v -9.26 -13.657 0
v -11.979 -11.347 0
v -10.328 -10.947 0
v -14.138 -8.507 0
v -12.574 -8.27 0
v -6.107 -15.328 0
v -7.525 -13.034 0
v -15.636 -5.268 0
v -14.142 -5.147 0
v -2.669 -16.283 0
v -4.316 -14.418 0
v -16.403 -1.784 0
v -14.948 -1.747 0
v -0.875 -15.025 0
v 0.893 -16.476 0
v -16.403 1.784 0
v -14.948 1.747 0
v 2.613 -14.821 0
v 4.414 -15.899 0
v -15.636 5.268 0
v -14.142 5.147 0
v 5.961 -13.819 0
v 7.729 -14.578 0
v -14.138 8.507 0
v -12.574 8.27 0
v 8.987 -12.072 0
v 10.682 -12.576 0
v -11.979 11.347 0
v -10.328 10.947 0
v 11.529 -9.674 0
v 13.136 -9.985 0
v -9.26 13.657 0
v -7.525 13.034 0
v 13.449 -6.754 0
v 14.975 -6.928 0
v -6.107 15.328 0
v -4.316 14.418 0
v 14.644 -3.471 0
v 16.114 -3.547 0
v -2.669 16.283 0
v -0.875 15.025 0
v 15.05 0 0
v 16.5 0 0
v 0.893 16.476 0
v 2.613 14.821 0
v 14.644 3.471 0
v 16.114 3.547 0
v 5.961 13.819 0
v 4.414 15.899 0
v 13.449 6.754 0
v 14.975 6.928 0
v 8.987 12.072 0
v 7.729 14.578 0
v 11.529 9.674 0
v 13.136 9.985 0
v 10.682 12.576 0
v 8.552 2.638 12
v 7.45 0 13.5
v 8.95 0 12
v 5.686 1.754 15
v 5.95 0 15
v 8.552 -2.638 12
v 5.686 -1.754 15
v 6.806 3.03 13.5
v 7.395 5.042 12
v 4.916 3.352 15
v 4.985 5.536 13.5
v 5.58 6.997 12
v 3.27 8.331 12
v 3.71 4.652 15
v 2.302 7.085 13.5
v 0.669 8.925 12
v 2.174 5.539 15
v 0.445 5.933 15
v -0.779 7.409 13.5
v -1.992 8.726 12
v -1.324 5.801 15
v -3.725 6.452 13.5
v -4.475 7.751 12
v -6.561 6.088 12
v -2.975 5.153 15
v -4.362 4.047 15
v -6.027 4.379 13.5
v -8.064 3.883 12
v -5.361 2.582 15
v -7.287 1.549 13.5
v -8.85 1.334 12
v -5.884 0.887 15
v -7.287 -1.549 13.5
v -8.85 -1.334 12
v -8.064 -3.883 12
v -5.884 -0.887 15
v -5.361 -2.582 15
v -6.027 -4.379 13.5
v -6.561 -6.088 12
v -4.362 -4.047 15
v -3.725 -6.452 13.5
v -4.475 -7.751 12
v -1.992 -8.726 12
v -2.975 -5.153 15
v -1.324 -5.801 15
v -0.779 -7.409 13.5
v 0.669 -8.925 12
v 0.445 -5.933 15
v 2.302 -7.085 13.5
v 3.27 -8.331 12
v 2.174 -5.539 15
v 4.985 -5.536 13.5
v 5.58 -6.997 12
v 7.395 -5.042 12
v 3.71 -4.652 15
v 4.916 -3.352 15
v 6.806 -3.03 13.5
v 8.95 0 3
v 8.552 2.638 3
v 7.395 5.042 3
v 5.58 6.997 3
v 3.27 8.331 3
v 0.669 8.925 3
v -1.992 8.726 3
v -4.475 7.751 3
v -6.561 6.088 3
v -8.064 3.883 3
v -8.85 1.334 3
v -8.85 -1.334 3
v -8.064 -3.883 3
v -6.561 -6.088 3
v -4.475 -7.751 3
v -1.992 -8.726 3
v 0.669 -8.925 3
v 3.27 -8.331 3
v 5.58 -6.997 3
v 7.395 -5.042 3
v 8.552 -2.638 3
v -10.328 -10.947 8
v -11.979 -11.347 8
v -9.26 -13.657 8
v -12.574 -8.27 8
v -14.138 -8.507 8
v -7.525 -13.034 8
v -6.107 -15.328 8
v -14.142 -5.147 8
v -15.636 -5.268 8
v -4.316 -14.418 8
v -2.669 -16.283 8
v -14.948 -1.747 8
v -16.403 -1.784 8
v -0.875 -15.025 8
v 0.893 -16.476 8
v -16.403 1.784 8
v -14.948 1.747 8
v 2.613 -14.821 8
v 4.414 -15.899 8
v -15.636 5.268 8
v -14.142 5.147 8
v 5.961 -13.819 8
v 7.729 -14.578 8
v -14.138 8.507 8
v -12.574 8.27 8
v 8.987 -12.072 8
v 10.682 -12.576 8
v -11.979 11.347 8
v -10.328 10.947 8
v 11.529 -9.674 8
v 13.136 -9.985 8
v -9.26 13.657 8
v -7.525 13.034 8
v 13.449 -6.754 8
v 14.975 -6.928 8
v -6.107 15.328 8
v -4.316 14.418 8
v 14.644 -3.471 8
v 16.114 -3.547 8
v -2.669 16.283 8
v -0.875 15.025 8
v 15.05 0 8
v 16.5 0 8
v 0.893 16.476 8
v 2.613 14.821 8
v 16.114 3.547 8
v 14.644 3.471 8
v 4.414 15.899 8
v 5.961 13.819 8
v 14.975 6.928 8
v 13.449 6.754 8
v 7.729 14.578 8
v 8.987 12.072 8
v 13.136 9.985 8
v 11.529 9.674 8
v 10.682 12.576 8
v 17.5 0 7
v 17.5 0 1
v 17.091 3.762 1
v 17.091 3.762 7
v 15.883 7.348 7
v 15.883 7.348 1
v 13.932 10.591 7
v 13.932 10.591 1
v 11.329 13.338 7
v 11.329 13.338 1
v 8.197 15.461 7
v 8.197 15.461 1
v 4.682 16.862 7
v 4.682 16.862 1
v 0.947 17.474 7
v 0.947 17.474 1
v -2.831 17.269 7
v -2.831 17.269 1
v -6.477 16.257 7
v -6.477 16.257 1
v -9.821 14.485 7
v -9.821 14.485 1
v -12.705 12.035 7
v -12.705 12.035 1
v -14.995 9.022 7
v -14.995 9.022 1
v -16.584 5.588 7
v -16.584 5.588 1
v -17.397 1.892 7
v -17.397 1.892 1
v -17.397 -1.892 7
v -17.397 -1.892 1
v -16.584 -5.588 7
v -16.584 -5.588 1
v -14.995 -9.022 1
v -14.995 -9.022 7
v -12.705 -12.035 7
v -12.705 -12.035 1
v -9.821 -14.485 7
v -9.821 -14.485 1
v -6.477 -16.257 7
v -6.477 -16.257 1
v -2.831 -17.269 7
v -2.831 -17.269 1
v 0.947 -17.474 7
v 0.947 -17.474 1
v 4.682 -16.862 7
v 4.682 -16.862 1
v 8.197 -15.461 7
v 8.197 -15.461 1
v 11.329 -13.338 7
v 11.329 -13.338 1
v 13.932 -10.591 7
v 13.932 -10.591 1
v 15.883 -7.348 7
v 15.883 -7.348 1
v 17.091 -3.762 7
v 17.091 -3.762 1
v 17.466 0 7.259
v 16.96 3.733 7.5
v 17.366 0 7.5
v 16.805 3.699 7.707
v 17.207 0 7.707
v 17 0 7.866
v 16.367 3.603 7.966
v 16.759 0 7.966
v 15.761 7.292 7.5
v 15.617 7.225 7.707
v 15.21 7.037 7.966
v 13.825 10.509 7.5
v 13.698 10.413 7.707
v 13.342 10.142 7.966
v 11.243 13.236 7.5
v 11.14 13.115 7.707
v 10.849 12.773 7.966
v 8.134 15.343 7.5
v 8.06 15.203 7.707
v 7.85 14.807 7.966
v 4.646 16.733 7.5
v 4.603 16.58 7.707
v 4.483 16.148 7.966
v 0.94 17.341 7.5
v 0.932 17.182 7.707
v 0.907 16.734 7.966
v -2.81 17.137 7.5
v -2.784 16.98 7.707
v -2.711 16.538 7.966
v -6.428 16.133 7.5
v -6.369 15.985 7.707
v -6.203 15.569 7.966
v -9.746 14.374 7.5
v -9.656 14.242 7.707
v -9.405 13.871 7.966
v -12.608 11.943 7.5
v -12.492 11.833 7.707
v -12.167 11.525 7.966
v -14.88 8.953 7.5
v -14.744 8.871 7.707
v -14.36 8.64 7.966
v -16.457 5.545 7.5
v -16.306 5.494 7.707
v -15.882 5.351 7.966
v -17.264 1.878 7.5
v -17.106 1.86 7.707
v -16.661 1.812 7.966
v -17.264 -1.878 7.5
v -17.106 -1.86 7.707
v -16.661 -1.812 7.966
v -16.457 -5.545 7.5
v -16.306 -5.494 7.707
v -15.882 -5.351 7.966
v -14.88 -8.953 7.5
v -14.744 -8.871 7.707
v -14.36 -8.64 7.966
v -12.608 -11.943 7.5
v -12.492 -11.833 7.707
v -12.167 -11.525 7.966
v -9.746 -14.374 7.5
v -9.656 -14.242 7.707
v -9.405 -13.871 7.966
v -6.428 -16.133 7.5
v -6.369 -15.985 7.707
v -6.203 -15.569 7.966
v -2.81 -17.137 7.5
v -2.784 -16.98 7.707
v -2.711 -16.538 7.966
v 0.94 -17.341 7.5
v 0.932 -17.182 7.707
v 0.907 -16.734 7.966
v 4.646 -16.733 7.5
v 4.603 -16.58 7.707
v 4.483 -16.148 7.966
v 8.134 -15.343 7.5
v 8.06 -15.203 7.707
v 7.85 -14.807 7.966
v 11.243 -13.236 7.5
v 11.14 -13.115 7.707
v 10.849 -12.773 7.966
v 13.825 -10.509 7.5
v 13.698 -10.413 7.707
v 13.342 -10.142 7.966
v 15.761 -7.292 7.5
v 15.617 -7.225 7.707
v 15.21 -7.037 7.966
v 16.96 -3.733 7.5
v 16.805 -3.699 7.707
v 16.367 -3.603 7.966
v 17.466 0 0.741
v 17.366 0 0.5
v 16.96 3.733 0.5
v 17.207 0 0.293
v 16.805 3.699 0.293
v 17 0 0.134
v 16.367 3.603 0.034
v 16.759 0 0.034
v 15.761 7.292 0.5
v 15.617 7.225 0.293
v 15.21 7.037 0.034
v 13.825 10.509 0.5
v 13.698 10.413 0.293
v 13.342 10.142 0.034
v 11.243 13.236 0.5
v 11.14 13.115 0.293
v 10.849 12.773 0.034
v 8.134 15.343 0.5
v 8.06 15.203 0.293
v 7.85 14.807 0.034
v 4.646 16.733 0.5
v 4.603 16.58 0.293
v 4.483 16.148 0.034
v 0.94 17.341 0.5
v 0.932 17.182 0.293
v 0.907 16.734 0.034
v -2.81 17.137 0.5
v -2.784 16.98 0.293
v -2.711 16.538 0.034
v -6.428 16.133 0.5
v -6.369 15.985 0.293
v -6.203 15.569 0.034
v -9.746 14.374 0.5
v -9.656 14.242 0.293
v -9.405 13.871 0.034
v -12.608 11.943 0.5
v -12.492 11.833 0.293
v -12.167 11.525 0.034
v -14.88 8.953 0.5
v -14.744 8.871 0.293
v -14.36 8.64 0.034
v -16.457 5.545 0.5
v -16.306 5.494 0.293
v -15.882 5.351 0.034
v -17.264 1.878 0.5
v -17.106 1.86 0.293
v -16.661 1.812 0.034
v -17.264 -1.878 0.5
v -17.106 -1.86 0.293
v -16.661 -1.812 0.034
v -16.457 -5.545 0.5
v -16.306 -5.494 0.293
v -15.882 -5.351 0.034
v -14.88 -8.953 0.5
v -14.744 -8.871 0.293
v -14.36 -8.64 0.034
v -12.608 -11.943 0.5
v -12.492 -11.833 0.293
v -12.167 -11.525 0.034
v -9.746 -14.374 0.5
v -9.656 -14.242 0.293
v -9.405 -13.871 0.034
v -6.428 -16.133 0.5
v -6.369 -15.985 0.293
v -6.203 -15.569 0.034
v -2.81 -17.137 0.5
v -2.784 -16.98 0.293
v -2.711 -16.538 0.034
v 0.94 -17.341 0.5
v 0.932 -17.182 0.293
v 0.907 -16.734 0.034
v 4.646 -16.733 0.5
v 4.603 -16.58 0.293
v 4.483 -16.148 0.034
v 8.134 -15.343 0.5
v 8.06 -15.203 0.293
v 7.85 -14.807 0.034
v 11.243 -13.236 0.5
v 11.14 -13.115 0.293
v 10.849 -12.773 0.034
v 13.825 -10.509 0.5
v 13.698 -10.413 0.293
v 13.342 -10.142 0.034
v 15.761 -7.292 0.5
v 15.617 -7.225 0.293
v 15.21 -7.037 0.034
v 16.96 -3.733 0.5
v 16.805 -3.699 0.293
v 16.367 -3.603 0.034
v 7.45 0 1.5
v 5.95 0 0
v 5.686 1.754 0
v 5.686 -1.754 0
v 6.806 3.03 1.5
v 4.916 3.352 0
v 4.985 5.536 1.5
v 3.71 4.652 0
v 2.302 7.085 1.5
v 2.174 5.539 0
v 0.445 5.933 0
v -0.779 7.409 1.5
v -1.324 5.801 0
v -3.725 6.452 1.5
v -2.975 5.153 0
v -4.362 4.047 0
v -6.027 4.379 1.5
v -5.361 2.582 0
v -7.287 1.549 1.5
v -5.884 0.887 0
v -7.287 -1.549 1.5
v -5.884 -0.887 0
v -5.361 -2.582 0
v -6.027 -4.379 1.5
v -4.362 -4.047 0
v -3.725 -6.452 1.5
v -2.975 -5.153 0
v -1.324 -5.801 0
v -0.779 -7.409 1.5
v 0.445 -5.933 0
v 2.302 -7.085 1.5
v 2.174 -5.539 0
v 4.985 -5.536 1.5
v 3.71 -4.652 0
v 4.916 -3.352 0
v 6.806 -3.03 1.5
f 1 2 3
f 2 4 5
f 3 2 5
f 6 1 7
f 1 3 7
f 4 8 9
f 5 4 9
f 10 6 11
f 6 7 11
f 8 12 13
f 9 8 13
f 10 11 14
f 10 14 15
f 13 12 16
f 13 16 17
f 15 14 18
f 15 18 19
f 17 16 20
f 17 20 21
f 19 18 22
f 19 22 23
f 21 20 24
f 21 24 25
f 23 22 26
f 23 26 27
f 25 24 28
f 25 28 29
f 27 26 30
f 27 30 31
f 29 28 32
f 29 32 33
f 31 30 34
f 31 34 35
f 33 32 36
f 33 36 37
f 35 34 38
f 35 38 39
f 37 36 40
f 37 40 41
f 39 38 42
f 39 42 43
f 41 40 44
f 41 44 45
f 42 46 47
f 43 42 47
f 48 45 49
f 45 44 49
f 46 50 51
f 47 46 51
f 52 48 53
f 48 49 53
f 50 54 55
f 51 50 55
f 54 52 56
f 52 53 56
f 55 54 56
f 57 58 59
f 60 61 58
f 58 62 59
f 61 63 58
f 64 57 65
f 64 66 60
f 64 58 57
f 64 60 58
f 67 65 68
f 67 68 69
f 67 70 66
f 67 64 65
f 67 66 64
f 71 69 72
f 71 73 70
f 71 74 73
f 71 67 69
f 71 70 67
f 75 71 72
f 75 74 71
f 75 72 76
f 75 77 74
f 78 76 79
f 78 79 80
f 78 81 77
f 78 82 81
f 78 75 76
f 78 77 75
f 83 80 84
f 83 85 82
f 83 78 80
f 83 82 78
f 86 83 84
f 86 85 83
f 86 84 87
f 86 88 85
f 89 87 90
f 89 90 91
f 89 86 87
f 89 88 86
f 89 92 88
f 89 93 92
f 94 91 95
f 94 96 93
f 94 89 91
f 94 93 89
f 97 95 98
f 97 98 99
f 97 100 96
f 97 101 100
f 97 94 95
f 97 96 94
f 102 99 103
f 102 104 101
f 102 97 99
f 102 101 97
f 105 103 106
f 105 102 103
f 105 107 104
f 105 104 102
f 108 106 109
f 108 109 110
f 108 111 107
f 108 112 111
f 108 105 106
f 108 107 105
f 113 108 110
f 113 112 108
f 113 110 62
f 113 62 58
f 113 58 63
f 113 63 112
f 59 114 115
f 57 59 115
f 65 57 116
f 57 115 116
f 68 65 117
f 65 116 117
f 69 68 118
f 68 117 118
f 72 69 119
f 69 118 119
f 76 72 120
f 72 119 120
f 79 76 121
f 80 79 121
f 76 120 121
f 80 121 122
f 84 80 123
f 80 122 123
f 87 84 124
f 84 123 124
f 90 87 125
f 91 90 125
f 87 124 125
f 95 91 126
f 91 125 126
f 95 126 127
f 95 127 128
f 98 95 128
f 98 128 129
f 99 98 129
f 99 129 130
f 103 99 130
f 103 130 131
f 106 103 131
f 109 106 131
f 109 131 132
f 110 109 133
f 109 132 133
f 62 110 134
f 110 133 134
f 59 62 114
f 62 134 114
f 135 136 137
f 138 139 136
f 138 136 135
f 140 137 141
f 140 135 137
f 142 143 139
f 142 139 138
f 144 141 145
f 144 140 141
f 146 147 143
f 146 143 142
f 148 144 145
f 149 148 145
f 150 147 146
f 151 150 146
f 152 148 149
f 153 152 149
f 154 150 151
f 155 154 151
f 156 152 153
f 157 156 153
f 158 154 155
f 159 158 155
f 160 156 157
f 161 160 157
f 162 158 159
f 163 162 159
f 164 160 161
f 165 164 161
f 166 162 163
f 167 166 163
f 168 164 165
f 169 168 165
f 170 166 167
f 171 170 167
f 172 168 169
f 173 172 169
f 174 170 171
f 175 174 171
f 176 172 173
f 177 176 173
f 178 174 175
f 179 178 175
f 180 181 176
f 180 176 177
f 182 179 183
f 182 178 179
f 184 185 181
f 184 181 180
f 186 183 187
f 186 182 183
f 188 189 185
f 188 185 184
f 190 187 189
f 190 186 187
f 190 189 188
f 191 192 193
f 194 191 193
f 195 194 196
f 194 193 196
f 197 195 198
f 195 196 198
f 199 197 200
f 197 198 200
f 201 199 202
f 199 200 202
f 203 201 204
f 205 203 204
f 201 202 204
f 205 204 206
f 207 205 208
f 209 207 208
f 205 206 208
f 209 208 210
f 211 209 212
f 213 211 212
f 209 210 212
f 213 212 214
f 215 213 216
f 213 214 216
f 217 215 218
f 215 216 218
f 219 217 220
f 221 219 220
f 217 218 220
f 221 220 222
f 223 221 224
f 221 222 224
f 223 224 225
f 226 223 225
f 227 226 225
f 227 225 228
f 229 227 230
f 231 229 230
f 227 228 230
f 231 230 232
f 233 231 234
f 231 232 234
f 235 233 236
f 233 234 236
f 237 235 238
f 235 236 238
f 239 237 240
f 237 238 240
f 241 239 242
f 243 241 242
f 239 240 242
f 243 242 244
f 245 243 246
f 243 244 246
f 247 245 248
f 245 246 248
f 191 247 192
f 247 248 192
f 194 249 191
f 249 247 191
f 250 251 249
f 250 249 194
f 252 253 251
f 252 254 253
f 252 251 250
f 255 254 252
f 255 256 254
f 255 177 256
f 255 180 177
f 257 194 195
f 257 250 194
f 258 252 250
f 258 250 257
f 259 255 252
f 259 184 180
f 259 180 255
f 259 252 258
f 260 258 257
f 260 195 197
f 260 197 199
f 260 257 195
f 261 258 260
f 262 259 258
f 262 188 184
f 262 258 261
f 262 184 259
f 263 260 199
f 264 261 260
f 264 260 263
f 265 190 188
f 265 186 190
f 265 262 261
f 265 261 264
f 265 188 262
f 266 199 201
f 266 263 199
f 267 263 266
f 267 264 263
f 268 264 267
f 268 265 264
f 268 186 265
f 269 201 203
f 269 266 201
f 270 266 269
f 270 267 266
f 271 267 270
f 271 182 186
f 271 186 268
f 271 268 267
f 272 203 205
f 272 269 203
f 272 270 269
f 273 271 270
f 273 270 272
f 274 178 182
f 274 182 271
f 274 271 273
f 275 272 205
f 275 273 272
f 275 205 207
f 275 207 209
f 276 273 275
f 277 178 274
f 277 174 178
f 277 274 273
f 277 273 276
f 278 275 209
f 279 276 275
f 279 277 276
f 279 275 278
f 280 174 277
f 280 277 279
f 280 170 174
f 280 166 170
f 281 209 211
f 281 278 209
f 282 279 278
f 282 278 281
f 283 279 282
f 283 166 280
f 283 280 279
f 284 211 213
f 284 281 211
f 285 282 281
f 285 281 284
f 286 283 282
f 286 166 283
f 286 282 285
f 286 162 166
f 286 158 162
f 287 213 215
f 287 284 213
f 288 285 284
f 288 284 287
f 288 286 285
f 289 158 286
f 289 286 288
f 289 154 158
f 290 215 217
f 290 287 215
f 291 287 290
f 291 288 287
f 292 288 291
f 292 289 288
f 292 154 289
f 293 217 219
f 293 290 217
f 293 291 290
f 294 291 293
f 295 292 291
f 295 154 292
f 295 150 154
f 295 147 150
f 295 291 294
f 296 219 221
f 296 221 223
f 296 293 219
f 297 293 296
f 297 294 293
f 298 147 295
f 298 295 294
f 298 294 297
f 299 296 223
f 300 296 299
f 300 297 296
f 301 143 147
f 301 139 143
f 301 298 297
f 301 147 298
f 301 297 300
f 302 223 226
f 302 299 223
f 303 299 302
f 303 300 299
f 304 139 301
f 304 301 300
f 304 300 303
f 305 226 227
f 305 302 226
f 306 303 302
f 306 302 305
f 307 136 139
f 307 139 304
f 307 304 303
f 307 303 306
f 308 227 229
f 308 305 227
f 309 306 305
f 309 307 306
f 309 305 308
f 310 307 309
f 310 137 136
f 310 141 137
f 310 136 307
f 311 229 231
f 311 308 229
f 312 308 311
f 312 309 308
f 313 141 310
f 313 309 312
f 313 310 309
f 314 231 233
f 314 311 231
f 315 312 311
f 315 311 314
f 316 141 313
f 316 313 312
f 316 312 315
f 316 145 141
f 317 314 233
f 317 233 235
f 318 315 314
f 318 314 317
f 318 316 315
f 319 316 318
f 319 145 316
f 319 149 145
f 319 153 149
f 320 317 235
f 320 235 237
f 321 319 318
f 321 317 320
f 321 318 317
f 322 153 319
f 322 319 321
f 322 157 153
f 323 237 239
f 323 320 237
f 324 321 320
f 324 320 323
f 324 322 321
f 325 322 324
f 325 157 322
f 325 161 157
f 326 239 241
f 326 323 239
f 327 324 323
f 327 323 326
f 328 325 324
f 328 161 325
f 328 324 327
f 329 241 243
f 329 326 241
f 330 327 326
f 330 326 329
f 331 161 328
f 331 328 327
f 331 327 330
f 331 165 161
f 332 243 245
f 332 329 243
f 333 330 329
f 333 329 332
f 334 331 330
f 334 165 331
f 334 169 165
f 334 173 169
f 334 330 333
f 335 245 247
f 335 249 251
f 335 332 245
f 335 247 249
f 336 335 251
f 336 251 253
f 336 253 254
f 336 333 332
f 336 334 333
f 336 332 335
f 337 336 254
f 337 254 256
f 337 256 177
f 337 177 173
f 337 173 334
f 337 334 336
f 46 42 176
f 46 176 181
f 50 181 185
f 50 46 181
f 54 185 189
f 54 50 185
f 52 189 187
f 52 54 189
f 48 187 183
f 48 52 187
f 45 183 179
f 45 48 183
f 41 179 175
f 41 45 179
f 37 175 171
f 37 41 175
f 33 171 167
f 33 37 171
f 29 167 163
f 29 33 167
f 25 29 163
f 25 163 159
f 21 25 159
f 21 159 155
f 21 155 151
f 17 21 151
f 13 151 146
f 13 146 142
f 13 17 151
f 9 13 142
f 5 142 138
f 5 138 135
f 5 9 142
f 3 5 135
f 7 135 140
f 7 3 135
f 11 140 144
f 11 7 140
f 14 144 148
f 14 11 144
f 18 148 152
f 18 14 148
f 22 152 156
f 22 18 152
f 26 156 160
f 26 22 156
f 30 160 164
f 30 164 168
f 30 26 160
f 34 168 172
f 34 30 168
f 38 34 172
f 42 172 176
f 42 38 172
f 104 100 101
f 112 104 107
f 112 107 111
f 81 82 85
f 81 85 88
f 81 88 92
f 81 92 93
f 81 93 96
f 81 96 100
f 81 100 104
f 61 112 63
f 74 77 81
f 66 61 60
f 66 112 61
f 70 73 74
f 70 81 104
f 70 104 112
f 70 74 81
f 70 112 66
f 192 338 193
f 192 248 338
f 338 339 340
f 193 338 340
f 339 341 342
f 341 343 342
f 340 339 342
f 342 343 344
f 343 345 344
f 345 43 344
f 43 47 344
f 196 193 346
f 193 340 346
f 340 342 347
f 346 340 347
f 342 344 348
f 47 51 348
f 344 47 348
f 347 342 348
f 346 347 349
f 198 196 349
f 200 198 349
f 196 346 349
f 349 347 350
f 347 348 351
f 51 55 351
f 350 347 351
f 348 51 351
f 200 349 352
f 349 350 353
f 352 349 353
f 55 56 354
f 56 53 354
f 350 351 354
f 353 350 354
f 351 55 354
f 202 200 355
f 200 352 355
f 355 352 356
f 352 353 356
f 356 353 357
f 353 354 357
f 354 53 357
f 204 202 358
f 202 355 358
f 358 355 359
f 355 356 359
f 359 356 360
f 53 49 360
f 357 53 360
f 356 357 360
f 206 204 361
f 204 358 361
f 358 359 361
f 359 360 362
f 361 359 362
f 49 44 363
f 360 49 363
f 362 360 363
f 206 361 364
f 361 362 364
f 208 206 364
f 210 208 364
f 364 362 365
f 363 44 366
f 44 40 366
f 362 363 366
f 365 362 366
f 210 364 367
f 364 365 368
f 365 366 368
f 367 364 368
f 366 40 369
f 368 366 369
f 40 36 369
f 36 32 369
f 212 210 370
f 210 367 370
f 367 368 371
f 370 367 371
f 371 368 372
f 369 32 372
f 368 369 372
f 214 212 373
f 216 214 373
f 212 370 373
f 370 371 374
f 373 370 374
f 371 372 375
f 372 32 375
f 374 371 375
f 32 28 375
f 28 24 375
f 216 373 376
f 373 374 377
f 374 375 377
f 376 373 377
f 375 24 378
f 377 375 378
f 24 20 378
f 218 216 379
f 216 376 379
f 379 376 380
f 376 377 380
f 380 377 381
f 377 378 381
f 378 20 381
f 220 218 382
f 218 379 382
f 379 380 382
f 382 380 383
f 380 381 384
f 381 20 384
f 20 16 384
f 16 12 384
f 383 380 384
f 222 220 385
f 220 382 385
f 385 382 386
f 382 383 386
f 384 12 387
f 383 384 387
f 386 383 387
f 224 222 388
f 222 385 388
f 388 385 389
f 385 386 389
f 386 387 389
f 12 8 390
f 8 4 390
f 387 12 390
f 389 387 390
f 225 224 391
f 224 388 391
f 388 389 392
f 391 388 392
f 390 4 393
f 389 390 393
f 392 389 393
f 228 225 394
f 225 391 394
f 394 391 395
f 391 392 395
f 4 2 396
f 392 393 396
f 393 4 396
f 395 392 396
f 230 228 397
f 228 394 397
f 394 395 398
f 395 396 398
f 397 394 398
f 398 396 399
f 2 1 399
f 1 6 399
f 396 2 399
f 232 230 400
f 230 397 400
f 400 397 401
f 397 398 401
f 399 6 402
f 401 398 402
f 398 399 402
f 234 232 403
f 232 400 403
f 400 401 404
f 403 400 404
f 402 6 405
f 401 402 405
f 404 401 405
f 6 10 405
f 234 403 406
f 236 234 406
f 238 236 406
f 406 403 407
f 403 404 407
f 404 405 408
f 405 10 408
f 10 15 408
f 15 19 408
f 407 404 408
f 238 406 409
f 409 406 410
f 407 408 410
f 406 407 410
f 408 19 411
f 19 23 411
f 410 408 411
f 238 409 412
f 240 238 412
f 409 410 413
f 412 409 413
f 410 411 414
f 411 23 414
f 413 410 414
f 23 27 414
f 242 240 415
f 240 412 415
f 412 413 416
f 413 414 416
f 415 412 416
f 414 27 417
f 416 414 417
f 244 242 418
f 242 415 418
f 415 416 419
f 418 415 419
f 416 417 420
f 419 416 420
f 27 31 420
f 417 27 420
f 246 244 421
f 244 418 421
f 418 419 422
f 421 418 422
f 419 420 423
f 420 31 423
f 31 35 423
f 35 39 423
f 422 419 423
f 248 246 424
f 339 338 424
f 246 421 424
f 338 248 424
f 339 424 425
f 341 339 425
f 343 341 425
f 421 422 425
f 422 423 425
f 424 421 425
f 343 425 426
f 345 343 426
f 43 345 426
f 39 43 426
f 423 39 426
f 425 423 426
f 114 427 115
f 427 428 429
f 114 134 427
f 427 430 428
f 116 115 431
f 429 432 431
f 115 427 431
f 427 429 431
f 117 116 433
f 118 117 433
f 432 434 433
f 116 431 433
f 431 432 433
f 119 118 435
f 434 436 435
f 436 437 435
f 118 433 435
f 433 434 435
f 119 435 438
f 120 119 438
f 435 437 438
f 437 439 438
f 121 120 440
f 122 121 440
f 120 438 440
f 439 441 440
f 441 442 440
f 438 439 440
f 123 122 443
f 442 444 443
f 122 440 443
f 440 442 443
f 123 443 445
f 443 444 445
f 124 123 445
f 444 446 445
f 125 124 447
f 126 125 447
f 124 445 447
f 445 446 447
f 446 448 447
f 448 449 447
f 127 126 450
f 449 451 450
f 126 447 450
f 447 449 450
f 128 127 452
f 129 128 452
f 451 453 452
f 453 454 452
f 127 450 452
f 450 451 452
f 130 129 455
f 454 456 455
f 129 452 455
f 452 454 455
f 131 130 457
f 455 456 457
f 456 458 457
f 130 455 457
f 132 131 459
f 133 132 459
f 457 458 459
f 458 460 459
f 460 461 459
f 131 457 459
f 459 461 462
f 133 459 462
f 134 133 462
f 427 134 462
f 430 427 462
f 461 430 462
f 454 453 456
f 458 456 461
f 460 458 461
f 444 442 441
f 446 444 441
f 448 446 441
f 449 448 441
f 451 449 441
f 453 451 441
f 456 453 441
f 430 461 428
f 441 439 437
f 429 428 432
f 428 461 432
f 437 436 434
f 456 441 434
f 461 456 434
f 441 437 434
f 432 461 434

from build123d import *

# Parameters (mm, degrees)
SKETCH_R     = 17.5
SKETCH_R_2   = 15.05
PAD_DEPTH    = 8
FILLET_R     = 1
SKETCH001_R  = 8.95
PAD001_DEPTH = 15
CHAMFER_SIZE = 3


with BuildPart() as ring:
    # Sketch → Pad (new body)
    with BuildSketch(Plane.XY):
        Circle(SKETCH_R)
        Circle(SKETCH_R_2, mode=Mode.SUBTRACT)
    extrude(amount=PAD_DEPTH)

    # Fillet
    fillet_edges = [ring.edges().sort_by_distance(p)[0] for p in [
        (17.5, 0, 4),
        (-17.5, 0, 0),
        (-17.5, 0, 8),
    ]]
    fillet(fillet_edges, radius=FILLET_R)


with BuildPart() as hub:
    # Sketch001 → Pad001 (new body)
    with BuildSketch(Plane.XY):
        Circle(SKETCH001_R)
    extrude(amount=PAD001_DEPTH)

    # Chamfer
    chamfer_edges = [hub.edges().sort_by_distance(p)[0] for p in [
        (8.95, 0, 7.5),
        (-8.95, 0, 0),
        (-8.95, 0, 15),
    ]]
    chamfer(chamfer_edges, length=CHAMFER_SIZE)


solid = Compound([ring.part, hub.part])
